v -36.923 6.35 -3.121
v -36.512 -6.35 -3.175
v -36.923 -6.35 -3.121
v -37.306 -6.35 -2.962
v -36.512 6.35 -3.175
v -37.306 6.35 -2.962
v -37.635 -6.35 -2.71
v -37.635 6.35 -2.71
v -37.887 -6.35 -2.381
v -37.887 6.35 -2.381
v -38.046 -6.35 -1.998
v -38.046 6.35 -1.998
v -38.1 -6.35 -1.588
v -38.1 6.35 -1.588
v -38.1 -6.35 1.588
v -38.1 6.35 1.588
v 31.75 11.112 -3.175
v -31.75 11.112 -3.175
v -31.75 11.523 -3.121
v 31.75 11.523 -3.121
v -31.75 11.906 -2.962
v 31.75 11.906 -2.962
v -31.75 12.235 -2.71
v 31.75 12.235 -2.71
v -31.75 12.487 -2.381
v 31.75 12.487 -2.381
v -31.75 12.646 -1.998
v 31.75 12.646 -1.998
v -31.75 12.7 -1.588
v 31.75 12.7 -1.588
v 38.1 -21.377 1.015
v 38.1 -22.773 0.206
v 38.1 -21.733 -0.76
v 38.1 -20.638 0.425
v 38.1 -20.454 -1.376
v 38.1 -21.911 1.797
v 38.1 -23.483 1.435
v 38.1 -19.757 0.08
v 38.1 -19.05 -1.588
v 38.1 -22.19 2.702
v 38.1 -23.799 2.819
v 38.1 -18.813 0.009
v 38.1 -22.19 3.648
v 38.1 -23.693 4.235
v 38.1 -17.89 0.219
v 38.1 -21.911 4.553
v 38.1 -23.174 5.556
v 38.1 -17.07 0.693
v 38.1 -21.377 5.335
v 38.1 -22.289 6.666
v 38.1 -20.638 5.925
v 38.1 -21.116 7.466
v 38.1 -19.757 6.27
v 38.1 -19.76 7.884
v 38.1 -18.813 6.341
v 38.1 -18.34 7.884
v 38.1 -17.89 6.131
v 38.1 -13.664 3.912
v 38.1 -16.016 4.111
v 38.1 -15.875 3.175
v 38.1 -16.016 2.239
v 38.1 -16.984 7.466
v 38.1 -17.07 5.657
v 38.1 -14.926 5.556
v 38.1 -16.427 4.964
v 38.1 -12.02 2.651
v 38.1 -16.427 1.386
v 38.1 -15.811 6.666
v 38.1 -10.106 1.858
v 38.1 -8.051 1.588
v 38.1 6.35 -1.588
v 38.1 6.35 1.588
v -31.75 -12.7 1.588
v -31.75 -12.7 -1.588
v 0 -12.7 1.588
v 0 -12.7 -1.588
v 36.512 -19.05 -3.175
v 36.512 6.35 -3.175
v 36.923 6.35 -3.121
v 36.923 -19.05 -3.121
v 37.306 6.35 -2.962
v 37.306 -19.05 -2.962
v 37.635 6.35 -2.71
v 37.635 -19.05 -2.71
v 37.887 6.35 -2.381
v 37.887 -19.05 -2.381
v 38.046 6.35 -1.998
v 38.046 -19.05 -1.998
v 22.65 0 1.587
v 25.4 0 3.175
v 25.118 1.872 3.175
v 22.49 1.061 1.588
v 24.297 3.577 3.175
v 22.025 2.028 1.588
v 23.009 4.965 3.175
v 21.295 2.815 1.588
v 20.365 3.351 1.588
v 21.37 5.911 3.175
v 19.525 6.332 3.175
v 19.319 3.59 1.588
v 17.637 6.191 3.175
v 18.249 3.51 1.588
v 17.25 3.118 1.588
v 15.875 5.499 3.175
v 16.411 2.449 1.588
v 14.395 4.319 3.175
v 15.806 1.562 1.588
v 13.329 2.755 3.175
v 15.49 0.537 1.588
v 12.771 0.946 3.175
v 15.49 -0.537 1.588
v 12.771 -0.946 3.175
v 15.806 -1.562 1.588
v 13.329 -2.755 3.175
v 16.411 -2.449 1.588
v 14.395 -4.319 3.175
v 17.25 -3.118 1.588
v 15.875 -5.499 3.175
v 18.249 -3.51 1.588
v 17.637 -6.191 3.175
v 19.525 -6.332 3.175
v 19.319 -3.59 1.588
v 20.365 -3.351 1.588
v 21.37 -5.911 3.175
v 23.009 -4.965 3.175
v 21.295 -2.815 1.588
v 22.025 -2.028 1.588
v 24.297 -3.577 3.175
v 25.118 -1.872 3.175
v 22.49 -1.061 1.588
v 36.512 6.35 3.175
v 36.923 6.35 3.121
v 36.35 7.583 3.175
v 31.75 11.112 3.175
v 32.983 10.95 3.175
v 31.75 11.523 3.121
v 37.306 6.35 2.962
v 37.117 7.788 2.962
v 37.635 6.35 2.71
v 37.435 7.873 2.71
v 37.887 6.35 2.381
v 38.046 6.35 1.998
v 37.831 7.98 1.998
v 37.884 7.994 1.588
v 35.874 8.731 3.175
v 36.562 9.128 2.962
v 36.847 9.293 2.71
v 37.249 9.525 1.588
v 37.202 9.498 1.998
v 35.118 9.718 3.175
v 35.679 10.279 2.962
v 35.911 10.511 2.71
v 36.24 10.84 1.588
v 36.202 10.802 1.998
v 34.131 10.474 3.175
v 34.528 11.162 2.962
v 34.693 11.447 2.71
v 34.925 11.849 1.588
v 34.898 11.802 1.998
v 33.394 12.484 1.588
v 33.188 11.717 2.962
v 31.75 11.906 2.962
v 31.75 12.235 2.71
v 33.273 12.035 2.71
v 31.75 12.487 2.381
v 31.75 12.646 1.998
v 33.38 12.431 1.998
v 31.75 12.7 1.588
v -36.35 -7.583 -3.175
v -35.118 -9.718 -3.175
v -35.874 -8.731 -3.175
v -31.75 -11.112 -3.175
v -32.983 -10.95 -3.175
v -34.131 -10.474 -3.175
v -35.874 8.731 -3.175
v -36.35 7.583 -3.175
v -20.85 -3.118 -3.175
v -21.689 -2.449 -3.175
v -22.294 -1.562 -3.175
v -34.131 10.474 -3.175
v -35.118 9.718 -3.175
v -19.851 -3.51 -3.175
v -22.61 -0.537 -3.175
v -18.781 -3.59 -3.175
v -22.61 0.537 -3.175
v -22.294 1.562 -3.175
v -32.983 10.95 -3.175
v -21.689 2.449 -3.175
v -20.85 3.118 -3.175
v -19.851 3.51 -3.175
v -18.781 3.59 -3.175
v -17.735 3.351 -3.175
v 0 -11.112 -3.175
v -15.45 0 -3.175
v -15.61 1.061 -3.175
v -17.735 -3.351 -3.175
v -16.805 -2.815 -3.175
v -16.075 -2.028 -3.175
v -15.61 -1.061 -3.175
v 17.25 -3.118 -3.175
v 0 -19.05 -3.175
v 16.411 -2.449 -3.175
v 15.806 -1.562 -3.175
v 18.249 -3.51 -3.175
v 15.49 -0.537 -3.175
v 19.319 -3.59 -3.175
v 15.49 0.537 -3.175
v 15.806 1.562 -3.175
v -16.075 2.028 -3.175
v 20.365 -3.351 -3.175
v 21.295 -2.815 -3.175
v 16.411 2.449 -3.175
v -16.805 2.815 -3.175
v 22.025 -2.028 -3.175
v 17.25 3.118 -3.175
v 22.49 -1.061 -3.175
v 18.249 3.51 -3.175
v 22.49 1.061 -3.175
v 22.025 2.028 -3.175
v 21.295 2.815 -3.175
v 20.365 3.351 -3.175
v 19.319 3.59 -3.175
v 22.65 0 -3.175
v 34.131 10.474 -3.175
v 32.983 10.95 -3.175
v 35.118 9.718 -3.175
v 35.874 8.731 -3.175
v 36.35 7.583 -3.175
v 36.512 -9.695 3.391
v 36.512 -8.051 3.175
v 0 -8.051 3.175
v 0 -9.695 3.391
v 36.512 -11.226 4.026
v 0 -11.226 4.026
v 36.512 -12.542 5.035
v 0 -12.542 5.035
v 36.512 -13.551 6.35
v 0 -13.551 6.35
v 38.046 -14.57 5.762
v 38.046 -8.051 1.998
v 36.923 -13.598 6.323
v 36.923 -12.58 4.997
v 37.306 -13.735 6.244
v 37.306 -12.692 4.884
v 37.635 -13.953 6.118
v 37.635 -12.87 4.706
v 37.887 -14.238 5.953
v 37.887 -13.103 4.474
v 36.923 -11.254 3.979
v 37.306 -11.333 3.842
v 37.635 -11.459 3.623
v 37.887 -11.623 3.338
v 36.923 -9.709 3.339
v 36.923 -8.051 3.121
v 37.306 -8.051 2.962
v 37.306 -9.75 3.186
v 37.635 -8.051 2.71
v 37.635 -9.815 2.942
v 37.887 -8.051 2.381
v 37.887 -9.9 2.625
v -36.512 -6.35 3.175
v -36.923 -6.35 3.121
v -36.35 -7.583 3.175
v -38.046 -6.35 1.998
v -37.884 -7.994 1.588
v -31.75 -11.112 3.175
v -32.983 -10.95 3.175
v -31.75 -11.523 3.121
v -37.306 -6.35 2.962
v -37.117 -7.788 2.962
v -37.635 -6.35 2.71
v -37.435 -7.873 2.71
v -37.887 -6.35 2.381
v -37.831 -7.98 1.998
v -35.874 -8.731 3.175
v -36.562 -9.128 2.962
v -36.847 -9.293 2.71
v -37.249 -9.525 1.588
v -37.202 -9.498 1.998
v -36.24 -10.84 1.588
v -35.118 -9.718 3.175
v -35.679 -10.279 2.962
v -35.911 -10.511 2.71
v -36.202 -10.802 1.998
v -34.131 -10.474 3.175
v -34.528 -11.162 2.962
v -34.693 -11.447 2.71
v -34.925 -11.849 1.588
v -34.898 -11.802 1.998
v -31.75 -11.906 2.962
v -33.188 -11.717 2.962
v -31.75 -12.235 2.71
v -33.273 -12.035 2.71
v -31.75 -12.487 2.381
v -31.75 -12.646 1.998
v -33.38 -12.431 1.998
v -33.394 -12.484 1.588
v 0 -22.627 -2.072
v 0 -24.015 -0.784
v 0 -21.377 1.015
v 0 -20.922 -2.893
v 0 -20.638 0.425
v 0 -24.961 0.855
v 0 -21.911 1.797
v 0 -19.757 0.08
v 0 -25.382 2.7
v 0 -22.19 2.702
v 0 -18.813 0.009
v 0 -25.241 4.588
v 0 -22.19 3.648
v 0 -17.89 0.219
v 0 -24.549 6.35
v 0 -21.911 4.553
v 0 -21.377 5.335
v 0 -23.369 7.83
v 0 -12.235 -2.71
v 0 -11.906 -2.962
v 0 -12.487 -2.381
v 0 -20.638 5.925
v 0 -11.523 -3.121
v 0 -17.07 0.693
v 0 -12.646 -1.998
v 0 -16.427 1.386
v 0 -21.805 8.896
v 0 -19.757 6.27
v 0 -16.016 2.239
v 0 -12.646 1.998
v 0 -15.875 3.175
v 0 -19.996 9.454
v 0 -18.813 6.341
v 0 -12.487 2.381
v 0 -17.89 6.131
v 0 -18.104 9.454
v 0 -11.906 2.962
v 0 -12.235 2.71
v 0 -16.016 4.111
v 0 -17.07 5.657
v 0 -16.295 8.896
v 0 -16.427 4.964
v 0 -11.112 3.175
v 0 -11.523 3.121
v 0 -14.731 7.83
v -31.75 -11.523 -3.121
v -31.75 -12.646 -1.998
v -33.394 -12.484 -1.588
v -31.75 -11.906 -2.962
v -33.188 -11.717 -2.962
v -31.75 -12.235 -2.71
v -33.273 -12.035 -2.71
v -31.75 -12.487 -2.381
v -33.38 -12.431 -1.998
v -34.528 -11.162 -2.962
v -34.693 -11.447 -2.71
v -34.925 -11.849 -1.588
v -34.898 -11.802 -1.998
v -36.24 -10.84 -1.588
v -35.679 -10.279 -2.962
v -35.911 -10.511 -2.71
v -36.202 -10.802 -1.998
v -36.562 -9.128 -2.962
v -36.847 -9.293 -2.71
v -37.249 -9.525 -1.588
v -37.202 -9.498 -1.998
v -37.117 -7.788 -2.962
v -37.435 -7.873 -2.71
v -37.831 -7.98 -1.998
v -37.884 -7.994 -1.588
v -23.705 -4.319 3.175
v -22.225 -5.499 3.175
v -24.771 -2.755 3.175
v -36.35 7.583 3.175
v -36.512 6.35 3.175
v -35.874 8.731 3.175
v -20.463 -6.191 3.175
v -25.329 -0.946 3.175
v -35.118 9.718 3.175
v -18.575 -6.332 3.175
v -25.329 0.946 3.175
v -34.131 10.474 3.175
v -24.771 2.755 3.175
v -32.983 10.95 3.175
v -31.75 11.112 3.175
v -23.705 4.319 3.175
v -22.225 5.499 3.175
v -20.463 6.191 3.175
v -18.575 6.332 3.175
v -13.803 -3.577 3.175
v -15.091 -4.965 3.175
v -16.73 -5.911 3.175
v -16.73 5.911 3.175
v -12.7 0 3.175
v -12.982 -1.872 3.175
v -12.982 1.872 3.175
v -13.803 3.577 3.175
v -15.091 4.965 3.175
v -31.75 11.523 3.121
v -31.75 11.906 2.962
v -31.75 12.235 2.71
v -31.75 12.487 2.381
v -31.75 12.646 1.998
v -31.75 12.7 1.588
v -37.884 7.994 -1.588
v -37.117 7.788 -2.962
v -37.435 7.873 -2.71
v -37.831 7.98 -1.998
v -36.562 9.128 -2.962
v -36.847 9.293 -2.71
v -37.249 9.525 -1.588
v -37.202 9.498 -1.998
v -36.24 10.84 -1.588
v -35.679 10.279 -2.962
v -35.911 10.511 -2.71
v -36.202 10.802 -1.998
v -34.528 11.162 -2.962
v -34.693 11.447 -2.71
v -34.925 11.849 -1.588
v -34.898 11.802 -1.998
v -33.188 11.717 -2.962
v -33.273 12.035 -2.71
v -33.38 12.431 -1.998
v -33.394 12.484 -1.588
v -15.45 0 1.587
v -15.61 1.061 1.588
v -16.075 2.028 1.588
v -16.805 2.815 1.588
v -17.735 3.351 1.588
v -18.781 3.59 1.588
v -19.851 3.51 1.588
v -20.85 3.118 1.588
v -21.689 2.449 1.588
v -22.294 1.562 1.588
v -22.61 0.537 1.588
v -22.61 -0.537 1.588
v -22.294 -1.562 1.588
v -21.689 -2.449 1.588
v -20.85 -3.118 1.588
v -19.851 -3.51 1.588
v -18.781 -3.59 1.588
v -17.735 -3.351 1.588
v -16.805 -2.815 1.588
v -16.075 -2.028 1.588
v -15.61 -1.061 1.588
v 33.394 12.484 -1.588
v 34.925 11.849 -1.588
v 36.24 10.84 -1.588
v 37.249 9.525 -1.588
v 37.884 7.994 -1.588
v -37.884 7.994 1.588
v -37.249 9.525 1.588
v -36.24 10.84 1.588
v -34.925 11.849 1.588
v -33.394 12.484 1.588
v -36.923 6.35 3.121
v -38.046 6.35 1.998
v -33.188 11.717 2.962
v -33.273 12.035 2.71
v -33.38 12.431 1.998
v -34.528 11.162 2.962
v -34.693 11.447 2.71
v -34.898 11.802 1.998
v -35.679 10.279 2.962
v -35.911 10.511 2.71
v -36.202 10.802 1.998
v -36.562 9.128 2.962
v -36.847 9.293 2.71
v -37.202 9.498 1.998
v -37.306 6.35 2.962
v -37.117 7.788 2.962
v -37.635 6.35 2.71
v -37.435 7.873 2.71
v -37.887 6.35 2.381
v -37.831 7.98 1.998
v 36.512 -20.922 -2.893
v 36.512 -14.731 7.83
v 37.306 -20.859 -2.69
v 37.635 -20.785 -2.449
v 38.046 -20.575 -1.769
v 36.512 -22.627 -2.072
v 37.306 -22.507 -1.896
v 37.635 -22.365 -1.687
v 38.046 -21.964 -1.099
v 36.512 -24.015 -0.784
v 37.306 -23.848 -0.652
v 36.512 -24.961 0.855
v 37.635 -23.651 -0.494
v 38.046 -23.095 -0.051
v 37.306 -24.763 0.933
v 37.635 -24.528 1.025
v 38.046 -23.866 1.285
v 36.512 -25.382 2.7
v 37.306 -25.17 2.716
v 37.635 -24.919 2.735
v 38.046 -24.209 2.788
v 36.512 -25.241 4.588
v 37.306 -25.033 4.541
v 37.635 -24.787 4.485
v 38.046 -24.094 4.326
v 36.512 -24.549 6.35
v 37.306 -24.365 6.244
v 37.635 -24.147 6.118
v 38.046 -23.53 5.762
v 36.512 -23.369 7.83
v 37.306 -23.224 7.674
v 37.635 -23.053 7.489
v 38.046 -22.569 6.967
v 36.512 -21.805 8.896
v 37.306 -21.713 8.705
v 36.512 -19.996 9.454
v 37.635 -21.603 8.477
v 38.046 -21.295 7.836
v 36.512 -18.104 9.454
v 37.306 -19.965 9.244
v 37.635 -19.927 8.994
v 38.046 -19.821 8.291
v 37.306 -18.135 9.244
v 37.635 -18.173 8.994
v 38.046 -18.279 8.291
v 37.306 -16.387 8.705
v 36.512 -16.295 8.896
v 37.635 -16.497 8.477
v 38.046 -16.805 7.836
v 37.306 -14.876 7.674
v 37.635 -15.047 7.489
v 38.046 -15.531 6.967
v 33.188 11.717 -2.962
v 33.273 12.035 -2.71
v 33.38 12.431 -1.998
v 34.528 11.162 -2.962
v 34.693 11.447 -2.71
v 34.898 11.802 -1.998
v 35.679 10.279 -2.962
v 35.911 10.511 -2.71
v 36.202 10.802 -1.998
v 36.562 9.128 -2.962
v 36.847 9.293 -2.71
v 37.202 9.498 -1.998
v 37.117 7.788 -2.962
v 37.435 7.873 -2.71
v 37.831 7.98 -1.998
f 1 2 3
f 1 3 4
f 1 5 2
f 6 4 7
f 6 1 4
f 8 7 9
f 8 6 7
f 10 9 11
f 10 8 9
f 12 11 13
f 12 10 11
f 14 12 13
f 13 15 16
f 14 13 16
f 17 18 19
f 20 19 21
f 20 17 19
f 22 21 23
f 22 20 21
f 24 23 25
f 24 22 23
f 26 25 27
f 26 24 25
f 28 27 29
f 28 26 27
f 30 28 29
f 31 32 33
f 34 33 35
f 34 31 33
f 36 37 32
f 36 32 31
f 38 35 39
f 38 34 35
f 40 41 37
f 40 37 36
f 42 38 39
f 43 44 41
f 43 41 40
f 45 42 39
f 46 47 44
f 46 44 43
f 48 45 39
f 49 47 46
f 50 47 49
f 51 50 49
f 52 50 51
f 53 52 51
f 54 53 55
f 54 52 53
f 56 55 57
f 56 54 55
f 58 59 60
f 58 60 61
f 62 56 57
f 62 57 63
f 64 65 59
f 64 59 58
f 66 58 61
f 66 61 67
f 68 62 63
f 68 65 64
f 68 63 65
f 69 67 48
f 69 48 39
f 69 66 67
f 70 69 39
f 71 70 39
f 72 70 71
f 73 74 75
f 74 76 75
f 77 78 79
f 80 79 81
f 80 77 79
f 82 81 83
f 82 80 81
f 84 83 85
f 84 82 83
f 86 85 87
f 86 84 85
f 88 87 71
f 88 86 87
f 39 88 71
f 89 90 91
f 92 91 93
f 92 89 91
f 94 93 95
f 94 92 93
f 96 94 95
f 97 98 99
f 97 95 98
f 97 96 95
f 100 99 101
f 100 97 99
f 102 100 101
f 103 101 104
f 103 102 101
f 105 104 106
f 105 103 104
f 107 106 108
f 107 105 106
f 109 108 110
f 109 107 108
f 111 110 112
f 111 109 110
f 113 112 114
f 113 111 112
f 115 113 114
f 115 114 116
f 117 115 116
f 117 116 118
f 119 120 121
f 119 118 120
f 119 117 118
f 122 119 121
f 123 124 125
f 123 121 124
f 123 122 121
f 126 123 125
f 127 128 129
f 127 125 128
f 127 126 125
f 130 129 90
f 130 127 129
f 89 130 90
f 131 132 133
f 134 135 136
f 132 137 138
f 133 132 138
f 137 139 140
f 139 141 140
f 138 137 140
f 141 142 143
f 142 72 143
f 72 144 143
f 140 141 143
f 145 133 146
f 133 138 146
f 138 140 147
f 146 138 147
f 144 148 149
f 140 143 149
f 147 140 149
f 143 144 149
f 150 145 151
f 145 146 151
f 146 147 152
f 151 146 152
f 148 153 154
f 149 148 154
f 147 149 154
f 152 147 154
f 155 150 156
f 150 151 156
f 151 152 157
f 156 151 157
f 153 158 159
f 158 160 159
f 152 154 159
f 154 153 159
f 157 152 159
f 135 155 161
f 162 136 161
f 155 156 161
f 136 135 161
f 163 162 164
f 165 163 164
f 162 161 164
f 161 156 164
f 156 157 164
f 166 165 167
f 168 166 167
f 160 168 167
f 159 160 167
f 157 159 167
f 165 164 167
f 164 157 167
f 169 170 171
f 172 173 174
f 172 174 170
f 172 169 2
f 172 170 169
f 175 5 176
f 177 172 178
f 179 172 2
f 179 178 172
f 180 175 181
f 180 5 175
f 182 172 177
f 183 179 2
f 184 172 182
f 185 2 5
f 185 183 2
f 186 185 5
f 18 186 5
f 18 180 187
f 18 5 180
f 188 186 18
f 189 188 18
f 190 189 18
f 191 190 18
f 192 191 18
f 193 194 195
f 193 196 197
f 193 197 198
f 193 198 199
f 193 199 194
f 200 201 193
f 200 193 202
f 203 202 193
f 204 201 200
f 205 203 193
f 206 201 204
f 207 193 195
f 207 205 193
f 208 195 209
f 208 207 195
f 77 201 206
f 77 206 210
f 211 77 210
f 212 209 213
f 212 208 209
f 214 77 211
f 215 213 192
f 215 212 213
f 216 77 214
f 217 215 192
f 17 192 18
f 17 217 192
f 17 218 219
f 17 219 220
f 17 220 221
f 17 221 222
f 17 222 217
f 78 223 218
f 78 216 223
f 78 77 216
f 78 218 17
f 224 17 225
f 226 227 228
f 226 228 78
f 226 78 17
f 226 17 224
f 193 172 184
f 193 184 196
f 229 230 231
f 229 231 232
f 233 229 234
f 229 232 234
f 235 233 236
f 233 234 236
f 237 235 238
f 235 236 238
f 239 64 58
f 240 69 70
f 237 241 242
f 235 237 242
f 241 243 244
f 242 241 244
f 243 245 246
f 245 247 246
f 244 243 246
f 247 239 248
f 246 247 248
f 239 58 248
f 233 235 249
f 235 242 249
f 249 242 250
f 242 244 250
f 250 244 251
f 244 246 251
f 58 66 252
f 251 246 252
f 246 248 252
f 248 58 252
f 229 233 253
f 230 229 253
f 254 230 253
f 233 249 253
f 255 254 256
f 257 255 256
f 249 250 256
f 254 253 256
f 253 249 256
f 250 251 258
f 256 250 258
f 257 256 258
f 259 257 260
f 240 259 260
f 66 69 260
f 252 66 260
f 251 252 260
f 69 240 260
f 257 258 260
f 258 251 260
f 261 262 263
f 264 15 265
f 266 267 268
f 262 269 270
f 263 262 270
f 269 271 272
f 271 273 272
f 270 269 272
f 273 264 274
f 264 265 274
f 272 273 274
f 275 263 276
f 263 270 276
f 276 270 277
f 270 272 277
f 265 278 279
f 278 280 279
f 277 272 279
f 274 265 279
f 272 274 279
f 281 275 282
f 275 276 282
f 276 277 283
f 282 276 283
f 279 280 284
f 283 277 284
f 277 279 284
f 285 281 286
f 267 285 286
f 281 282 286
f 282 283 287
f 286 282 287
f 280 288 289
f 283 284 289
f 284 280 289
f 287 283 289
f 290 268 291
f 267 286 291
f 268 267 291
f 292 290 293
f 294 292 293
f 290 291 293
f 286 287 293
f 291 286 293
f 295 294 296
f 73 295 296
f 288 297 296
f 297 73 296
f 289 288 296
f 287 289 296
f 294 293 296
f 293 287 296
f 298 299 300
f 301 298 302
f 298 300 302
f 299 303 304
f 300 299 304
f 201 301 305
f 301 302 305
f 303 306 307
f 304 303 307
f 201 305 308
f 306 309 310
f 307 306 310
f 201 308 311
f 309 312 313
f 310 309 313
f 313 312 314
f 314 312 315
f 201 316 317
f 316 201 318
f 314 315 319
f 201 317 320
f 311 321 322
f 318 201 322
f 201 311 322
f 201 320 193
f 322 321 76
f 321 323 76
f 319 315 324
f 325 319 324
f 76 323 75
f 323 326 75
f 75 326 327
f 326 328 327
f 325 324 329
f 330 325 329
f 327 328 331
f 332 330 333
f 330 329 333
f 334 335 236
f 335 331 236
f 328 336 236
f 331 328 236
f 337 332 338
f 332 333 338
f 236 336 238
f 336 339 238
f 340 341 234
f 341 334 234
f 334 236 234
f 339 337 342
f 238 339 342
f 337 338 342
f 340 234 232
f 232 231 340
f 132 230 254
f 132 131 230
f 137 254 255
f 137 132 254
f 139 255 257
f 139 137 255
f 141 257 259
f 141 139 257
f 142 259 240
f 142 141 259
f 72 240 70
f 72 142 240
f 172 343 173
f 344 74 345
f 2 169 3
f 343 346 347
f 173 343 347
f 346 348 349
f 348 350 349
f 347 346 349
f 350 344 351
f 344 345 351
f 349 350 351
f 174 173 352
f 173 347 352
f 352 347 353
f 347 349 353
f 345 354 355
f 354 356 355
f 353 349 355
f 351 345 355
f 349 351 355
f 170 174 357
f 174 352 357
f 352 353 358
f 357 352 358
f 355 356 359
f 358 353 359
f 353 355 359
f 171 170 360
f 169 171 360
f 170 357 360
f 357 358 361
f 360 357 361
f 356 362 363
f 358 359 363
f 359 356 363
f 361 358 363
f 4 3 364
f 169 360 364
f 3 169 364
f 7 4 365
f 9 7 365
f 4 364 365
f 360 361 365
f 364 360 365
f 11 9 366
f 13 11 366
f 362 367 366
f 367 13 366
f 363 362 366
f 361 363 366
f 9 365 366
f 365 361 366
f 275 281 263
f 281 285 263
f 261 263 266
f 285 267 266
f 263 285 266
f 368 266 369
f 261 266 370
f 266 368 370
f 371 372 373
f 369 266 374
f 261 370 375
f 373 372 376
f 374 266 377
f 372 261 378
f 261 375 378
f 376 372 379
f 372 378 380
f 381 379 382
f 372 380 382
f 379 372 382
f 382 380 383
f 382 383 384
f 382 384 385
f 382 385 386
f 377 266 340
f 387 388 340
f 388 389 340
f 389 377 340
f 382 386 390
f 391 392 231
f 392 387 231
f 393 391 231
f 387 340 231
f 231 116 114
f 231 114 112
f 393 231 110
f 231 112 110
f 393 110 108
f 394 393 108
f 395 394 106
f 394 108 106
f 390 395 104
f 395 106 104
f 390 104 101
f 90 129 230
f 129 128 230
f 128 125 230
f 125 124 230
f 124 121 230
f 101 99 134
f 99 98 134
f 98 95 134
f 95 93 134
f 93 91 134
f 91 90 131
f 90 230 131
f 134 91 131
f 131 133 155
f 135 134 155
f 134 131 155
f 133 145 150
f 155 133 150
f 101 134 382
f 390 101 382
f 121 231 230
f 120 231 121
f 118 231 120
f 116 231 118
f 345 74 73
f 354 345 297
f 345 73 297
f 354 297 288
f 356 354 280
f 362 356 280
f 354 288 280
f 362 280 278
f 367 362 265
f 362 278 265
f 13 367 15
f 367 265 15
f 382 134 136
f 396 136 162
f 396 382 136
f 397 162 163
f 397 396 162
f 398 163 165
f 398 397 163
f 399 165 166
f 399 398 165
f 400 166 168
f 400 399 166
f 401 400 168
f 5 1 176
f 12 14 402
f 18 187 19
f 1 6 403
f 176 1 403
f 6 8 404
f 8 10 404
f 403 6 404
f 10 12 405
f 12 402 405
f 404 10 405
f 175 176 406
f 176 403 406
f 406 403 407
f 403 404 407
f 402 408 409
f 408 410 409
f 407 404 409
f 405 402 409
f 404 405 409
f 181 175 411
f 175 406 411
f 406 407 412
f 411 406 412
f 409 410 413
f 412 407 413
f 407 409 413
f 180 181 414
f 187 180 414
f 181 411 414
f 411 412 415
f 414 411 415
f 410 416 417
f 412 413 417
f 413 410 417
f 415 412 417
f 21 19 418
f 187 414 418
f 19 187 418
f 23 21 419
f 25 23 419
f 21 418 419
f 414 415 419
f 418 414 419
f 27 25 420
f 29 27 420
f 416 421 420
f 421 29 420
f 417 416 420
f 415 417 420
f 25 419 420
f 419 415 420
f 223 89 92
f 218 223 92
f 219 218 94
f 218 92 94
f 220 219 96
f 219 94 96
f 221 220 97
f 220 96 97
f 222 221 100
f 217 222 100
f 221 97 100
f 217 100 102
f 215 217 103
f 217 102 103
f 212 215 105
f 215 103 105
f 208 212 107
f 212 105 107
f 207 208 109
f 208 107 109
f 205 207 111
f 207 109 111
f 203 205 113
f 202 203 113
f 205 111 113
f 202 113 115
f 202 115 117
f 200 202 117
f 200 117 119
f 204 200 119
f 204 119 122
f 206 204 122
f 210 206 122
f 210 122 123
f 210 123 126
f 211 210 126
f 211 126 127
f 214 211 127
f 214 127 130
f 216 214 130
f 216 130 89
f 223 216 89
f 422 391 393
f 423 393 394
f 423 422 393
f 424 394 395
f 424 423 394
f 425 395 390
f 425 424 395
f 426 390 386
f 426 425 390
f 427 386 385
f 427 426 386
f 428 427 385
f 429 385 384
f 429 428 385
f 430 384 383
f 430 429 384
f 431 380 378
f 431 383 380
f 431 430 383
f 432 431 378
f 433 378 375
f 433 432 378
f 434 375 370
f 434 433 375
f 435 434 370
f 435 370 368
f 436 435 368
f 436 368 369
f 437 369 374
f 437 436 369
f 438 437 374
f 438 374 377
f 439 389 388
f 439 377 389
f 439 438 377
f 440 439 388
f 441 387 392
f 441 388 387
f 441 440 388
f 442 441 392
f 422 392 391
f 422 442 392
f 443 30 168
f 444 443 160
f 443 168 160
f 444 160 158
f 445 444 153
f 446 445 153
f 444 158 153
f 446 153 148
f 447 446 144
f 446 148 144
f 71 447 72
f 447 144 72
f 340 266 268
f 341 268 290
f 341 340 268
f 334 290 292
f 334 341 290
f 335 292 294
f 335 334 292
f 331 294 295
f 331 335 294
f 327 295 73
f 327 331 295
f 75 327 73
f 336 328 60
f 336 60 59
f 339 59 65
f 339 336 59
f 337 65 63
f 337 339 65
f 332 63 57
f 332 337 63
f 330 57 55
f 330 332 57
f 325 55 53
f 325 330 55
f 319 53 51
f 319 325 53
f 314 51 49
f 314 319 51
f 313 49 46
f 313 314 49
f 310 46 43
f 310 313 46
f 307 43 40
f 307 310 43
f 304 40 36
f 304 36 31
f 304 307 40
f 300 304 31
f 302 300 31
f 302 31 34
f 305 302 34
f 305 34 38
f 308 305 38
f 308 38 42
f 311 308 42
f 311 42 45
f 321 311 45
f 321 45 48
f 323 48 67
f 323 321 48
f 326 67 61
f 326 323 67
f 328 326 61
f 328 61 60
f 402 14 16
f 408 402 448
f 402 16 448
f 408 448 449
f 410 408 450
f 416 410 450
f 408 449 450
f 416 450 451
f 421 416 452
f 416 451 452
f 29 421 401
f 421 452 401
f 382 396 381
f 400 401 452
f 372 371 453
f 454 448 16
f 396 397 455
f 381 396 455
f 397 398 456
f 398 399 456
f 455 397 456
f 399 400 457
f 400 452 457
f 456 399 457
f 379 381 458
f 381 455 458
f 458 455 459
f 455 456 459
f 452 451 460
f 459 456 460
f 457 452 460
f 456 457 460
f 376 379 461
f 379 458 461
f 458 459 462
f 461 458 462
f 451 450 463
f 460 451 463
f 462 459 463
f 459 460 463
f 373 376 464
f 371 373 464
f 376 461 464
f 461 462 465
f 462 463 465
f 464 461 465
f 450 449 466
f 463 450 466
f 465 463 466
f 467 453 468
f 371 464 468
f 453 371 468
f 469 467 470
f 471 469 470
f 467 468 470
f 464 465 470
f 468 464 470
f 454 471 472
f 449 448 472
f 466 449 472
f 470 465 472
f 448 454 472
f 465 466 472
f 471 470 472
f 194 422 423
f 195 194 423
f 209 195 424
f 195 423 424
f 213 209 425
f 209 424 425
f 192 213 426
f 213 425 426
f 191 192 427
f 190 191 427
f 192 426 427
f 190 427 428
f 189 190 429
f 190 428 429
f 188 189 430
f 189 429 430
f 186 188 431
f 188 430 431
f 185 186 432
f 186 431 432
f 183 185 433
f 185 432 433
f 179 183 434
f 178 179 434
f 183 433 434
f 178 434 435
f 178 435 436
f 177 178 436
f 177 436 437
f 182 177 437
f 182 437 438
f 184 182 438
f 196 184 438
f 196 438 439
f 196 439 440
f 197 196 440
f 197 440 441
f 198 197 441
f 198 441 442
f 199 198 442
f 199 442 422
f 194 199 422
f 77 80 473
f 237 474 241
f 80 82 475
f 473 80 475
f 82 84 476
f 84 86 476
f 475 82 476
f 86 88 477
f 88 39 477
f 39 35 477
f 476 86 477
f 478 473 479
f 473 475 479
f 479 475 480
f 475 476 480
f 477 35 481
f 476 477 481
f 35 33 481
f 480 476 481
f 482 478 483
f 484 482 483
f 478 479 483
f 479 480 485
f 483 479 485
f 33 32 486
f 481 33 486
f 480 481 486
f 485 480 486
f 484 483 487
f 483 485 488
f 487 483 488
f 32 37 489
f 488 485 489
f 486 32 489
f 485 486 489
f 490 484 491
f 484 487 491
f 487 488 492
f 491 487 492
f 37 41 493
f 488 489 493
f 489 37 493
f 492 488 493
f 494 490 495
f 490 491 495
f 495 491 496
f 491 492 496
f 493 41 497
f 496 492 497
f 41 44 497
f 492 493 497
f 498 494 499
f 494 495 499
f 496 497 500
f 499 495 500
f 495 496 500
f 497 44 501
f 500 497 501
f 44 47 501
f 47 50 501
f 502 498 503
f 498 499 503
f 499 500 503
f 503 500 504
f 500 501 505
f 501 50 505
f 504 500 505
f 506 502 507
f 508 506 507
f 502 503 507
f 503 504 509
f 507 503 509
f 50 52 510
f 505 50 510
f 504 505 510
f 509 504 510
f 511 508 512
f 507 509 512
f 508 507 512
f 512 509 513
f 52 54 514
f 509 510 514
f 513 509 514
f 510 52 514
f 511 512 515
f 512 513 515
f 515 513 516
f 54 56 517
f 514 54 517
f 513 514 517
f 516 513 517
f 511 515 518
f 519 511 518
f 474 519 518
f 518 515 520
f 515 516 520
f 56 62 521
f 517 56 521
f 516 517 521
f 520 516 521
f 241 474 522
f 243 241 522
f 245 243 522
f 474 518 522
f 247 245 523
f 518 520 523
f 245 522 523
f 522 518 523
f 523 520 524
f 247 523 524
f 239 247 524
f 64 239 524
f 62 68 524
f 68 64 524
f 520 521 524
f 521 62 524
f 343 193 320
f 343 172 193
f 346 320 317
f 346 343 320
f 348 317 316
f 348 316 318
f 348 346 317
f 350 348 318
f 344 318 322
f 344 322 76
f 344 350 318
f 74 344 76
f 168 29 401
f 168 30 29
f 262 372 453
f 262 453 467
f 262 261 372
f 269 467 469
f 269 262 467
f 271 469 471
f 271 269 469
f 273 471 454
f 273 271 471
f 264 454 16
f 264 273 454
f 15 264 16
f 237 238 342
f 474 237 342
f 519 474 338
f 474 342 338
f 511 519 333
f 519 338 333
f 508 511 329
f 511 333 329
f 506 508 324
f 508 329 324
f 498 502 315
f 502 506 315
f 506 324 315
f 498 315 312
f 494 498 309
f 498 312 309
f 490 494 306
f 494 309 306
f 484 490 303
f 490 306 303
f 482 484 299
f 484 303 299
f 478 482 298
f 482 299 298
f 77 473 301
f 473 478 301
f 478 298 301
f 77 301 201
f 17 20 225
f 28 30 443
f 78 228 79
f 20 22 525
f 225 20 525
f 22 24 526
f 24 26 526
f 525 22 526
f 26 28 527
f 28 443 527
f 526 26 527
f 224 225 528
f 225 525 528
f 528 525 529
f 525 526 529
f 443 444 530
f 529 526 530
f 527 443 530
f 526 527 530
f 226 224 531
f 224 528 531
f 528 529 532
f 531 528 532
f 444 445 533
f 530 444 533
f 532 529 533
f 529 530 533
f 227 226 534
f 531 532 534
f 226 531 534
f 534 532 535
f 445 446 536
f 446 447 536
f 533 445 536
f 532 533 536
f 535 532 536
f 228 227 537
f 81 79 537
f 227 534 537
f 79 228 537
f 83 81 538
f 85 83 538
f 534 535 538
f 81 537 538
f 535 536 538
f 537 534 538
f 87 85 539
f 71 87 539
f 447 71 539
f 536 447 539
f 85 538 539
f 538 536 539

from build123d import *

# Parameters (mm, degrees)
F0_R     = 3.175
F1_DEPTH = 38.1
F2_W     = 25.4
F2_H     = 6.35
F3_DEPTH = 38.1
F4_R     = 6.35
F5_DEPTH = 1.5875
F5_TAPER = 60
F6_R     = 3.600369343
F7_DEPTH = 4.7635
F8_R     = 6.35
F9_R     = 1.5875


with BuildPart() as f1:
    # F0 (on Right) → F1 (new body)
    with BuildSketch(Plane.YZ):
        with BuildLine():
            Line((12.7, -3.175), (12.7, 3.175))
            Line((12.7, 3.175), (-8.0514773719, 3.175))
            ThreePointArc((-8.0514773719, 3.175), (-11.2264773719, 4.025738686), (-13.550738686, 6.35))
            ThreePointArc((-13.550738686, 6.35), (-24.549261314, 6.35), (-19.05, -3.175))
            Line((-19.05, -3.175), (12.7, -3.175))
        make_face()
        with Locations((-19.05, 3.175)):
            Circle(F0_R, mode=Mode.SUBTRACT)
    extrude(amount=F1_DEPTH)

    # F2 (on Right) → F3 (join)
    with BuildSketch(Plane.YZ):
        Rectangle(F2_W, F2_H)
    extrude(amount=-F3_DEPTH)

    # F4 (on face) → F5 (cut)
    with BuildSketch(Plane.XY.offset(3.175)):
        with Locations((19.05, 0)):
            Circle(F4_R)
        with Locations((-19.05, 0)):
            Circle(F4_R)
    extrude(amount=-F5_DEPTH, taper=F5_TAPER, mode=Mode.SUBTRACT)

    # F6 (on face) → F7 (cut, through all)
    with BuildSketch(Plane.XY.offset(1.5875)):
        with Locations((19.05, 0)):
            Circle(F6_R)
        with Locations((-19.05, 0)):
            Circle(F6_R)
    extrude(amount=-F7_DEPTH, mode=Mode.SUBTRACT)

    # F8
    f8_edges = [f1.edges().sort_by_distance(p)[0] for p in [
        (38.1, 12.7, 0),
        (-38.1, 12.7, 0),
        (-38.1, -12.7, 0),
    ]]
    fillet(f8_edges, radius=F8_R)

    # F9
    f9_edges = [f1.edges().sort_by_distance(p)[0] for p in [
        (0, 12.7, 3.175),
        (36.240128, 10.840128, 3.175),
    ]]
    fillet(f9_edges, radius=F9_R)


solid = f1.part
